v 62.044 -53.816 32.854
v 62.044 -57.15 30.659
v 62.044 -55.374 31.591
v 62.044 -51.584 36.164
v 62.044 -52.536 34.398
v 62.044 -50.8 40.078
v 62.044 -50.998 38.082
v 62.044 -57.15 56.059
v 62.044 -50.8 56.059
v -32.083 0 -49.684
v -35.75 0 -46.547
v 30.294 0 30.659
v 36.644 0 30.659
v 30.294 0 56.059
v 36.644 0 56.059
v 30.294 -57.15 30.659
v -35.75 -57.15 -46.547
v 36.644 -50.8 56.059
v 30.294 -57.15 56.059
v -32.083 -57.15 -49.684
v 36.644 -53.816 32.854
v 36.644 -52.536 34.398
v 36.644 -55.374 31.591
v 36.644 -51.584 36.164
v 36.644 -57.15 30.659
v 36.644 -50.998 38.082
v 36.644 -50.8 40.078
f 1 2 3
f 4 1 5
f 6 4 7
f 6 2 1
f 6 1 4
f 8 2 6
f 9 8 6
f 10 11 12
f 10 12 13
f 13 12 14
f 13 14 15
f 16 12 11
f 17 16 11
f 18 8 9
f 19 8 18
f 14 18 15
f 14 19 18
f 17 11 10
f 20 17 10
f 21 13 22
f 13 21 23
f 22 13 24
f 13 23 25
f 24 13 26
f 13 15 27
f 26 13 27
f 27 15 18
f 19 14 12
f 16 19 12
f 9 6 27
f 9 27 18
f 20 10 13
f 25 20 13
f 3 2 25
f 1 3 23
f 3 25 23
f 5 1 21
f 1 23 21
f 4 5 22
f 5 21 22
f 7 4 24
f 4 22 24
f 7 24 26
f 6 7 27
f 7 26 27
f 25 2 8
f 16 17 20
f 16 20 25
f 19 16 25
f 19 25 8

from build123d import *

# Parameters (mm, degrees)
F1_DEPTH    = 57.15
F2_W        = 6.35
F2_H        = 25.4
F3_DEPTH    = 25.4
F4_T1_DEPTH = 48.9464301965


# Not quite as in the source:
# - a fillet or chamfer that OpenCascade refuses, or shapes differently, is made with other operations: its cross-section is extruded or revolved along the edge and cut away or added


with BuildPart() as f1:
    # F0 (on Front) → F1 (new body)
    with BuildSketch(Plane.XZ):
        Polygon((36.6440817745, 56.0591582008), (30.2940817745, 56.0591582008), (30.2940817745, 30.6591582008), (-35.7496880067, -46.5469327059), (-32.0828693102, -49.6836091906), (36.6440817745, 30.6591582008), align=None)
    extrude(amount=F1_DEPTH)

    # F2 (on face) → F3 (join)
    with BuildSketch(Plane.YZ.offset(36.6440817745)):
        with Locations((-53.975, 43.3591582008)):
            Rectangle(F2_W, F2_H)
    extrude(amount=F3_DEPTH)

    # F4: fillet of radius 10.16 on 1 edges, made by hand

    # F4_s2 → F4_t1 (cut)
    with BuildSketch(Plane.YZ.offset(36.6440817745)):
        with BuildLine():
            ThreePointArc((-57.15, 30.6591582008), (-52.5357730325, 34.3981176165), (-50.8, 40.0777302794))
            Line((-50.8, 40.0777302794), (-50.8, 30.6591582008))
            Line((-50.8, 30.6591582008), (-57.15, 30.6591582008))
        make_face()
    extrude(amount=F4_T1_DEPTH, mode=Mode.SUBTRACT)


solid = f1.part
